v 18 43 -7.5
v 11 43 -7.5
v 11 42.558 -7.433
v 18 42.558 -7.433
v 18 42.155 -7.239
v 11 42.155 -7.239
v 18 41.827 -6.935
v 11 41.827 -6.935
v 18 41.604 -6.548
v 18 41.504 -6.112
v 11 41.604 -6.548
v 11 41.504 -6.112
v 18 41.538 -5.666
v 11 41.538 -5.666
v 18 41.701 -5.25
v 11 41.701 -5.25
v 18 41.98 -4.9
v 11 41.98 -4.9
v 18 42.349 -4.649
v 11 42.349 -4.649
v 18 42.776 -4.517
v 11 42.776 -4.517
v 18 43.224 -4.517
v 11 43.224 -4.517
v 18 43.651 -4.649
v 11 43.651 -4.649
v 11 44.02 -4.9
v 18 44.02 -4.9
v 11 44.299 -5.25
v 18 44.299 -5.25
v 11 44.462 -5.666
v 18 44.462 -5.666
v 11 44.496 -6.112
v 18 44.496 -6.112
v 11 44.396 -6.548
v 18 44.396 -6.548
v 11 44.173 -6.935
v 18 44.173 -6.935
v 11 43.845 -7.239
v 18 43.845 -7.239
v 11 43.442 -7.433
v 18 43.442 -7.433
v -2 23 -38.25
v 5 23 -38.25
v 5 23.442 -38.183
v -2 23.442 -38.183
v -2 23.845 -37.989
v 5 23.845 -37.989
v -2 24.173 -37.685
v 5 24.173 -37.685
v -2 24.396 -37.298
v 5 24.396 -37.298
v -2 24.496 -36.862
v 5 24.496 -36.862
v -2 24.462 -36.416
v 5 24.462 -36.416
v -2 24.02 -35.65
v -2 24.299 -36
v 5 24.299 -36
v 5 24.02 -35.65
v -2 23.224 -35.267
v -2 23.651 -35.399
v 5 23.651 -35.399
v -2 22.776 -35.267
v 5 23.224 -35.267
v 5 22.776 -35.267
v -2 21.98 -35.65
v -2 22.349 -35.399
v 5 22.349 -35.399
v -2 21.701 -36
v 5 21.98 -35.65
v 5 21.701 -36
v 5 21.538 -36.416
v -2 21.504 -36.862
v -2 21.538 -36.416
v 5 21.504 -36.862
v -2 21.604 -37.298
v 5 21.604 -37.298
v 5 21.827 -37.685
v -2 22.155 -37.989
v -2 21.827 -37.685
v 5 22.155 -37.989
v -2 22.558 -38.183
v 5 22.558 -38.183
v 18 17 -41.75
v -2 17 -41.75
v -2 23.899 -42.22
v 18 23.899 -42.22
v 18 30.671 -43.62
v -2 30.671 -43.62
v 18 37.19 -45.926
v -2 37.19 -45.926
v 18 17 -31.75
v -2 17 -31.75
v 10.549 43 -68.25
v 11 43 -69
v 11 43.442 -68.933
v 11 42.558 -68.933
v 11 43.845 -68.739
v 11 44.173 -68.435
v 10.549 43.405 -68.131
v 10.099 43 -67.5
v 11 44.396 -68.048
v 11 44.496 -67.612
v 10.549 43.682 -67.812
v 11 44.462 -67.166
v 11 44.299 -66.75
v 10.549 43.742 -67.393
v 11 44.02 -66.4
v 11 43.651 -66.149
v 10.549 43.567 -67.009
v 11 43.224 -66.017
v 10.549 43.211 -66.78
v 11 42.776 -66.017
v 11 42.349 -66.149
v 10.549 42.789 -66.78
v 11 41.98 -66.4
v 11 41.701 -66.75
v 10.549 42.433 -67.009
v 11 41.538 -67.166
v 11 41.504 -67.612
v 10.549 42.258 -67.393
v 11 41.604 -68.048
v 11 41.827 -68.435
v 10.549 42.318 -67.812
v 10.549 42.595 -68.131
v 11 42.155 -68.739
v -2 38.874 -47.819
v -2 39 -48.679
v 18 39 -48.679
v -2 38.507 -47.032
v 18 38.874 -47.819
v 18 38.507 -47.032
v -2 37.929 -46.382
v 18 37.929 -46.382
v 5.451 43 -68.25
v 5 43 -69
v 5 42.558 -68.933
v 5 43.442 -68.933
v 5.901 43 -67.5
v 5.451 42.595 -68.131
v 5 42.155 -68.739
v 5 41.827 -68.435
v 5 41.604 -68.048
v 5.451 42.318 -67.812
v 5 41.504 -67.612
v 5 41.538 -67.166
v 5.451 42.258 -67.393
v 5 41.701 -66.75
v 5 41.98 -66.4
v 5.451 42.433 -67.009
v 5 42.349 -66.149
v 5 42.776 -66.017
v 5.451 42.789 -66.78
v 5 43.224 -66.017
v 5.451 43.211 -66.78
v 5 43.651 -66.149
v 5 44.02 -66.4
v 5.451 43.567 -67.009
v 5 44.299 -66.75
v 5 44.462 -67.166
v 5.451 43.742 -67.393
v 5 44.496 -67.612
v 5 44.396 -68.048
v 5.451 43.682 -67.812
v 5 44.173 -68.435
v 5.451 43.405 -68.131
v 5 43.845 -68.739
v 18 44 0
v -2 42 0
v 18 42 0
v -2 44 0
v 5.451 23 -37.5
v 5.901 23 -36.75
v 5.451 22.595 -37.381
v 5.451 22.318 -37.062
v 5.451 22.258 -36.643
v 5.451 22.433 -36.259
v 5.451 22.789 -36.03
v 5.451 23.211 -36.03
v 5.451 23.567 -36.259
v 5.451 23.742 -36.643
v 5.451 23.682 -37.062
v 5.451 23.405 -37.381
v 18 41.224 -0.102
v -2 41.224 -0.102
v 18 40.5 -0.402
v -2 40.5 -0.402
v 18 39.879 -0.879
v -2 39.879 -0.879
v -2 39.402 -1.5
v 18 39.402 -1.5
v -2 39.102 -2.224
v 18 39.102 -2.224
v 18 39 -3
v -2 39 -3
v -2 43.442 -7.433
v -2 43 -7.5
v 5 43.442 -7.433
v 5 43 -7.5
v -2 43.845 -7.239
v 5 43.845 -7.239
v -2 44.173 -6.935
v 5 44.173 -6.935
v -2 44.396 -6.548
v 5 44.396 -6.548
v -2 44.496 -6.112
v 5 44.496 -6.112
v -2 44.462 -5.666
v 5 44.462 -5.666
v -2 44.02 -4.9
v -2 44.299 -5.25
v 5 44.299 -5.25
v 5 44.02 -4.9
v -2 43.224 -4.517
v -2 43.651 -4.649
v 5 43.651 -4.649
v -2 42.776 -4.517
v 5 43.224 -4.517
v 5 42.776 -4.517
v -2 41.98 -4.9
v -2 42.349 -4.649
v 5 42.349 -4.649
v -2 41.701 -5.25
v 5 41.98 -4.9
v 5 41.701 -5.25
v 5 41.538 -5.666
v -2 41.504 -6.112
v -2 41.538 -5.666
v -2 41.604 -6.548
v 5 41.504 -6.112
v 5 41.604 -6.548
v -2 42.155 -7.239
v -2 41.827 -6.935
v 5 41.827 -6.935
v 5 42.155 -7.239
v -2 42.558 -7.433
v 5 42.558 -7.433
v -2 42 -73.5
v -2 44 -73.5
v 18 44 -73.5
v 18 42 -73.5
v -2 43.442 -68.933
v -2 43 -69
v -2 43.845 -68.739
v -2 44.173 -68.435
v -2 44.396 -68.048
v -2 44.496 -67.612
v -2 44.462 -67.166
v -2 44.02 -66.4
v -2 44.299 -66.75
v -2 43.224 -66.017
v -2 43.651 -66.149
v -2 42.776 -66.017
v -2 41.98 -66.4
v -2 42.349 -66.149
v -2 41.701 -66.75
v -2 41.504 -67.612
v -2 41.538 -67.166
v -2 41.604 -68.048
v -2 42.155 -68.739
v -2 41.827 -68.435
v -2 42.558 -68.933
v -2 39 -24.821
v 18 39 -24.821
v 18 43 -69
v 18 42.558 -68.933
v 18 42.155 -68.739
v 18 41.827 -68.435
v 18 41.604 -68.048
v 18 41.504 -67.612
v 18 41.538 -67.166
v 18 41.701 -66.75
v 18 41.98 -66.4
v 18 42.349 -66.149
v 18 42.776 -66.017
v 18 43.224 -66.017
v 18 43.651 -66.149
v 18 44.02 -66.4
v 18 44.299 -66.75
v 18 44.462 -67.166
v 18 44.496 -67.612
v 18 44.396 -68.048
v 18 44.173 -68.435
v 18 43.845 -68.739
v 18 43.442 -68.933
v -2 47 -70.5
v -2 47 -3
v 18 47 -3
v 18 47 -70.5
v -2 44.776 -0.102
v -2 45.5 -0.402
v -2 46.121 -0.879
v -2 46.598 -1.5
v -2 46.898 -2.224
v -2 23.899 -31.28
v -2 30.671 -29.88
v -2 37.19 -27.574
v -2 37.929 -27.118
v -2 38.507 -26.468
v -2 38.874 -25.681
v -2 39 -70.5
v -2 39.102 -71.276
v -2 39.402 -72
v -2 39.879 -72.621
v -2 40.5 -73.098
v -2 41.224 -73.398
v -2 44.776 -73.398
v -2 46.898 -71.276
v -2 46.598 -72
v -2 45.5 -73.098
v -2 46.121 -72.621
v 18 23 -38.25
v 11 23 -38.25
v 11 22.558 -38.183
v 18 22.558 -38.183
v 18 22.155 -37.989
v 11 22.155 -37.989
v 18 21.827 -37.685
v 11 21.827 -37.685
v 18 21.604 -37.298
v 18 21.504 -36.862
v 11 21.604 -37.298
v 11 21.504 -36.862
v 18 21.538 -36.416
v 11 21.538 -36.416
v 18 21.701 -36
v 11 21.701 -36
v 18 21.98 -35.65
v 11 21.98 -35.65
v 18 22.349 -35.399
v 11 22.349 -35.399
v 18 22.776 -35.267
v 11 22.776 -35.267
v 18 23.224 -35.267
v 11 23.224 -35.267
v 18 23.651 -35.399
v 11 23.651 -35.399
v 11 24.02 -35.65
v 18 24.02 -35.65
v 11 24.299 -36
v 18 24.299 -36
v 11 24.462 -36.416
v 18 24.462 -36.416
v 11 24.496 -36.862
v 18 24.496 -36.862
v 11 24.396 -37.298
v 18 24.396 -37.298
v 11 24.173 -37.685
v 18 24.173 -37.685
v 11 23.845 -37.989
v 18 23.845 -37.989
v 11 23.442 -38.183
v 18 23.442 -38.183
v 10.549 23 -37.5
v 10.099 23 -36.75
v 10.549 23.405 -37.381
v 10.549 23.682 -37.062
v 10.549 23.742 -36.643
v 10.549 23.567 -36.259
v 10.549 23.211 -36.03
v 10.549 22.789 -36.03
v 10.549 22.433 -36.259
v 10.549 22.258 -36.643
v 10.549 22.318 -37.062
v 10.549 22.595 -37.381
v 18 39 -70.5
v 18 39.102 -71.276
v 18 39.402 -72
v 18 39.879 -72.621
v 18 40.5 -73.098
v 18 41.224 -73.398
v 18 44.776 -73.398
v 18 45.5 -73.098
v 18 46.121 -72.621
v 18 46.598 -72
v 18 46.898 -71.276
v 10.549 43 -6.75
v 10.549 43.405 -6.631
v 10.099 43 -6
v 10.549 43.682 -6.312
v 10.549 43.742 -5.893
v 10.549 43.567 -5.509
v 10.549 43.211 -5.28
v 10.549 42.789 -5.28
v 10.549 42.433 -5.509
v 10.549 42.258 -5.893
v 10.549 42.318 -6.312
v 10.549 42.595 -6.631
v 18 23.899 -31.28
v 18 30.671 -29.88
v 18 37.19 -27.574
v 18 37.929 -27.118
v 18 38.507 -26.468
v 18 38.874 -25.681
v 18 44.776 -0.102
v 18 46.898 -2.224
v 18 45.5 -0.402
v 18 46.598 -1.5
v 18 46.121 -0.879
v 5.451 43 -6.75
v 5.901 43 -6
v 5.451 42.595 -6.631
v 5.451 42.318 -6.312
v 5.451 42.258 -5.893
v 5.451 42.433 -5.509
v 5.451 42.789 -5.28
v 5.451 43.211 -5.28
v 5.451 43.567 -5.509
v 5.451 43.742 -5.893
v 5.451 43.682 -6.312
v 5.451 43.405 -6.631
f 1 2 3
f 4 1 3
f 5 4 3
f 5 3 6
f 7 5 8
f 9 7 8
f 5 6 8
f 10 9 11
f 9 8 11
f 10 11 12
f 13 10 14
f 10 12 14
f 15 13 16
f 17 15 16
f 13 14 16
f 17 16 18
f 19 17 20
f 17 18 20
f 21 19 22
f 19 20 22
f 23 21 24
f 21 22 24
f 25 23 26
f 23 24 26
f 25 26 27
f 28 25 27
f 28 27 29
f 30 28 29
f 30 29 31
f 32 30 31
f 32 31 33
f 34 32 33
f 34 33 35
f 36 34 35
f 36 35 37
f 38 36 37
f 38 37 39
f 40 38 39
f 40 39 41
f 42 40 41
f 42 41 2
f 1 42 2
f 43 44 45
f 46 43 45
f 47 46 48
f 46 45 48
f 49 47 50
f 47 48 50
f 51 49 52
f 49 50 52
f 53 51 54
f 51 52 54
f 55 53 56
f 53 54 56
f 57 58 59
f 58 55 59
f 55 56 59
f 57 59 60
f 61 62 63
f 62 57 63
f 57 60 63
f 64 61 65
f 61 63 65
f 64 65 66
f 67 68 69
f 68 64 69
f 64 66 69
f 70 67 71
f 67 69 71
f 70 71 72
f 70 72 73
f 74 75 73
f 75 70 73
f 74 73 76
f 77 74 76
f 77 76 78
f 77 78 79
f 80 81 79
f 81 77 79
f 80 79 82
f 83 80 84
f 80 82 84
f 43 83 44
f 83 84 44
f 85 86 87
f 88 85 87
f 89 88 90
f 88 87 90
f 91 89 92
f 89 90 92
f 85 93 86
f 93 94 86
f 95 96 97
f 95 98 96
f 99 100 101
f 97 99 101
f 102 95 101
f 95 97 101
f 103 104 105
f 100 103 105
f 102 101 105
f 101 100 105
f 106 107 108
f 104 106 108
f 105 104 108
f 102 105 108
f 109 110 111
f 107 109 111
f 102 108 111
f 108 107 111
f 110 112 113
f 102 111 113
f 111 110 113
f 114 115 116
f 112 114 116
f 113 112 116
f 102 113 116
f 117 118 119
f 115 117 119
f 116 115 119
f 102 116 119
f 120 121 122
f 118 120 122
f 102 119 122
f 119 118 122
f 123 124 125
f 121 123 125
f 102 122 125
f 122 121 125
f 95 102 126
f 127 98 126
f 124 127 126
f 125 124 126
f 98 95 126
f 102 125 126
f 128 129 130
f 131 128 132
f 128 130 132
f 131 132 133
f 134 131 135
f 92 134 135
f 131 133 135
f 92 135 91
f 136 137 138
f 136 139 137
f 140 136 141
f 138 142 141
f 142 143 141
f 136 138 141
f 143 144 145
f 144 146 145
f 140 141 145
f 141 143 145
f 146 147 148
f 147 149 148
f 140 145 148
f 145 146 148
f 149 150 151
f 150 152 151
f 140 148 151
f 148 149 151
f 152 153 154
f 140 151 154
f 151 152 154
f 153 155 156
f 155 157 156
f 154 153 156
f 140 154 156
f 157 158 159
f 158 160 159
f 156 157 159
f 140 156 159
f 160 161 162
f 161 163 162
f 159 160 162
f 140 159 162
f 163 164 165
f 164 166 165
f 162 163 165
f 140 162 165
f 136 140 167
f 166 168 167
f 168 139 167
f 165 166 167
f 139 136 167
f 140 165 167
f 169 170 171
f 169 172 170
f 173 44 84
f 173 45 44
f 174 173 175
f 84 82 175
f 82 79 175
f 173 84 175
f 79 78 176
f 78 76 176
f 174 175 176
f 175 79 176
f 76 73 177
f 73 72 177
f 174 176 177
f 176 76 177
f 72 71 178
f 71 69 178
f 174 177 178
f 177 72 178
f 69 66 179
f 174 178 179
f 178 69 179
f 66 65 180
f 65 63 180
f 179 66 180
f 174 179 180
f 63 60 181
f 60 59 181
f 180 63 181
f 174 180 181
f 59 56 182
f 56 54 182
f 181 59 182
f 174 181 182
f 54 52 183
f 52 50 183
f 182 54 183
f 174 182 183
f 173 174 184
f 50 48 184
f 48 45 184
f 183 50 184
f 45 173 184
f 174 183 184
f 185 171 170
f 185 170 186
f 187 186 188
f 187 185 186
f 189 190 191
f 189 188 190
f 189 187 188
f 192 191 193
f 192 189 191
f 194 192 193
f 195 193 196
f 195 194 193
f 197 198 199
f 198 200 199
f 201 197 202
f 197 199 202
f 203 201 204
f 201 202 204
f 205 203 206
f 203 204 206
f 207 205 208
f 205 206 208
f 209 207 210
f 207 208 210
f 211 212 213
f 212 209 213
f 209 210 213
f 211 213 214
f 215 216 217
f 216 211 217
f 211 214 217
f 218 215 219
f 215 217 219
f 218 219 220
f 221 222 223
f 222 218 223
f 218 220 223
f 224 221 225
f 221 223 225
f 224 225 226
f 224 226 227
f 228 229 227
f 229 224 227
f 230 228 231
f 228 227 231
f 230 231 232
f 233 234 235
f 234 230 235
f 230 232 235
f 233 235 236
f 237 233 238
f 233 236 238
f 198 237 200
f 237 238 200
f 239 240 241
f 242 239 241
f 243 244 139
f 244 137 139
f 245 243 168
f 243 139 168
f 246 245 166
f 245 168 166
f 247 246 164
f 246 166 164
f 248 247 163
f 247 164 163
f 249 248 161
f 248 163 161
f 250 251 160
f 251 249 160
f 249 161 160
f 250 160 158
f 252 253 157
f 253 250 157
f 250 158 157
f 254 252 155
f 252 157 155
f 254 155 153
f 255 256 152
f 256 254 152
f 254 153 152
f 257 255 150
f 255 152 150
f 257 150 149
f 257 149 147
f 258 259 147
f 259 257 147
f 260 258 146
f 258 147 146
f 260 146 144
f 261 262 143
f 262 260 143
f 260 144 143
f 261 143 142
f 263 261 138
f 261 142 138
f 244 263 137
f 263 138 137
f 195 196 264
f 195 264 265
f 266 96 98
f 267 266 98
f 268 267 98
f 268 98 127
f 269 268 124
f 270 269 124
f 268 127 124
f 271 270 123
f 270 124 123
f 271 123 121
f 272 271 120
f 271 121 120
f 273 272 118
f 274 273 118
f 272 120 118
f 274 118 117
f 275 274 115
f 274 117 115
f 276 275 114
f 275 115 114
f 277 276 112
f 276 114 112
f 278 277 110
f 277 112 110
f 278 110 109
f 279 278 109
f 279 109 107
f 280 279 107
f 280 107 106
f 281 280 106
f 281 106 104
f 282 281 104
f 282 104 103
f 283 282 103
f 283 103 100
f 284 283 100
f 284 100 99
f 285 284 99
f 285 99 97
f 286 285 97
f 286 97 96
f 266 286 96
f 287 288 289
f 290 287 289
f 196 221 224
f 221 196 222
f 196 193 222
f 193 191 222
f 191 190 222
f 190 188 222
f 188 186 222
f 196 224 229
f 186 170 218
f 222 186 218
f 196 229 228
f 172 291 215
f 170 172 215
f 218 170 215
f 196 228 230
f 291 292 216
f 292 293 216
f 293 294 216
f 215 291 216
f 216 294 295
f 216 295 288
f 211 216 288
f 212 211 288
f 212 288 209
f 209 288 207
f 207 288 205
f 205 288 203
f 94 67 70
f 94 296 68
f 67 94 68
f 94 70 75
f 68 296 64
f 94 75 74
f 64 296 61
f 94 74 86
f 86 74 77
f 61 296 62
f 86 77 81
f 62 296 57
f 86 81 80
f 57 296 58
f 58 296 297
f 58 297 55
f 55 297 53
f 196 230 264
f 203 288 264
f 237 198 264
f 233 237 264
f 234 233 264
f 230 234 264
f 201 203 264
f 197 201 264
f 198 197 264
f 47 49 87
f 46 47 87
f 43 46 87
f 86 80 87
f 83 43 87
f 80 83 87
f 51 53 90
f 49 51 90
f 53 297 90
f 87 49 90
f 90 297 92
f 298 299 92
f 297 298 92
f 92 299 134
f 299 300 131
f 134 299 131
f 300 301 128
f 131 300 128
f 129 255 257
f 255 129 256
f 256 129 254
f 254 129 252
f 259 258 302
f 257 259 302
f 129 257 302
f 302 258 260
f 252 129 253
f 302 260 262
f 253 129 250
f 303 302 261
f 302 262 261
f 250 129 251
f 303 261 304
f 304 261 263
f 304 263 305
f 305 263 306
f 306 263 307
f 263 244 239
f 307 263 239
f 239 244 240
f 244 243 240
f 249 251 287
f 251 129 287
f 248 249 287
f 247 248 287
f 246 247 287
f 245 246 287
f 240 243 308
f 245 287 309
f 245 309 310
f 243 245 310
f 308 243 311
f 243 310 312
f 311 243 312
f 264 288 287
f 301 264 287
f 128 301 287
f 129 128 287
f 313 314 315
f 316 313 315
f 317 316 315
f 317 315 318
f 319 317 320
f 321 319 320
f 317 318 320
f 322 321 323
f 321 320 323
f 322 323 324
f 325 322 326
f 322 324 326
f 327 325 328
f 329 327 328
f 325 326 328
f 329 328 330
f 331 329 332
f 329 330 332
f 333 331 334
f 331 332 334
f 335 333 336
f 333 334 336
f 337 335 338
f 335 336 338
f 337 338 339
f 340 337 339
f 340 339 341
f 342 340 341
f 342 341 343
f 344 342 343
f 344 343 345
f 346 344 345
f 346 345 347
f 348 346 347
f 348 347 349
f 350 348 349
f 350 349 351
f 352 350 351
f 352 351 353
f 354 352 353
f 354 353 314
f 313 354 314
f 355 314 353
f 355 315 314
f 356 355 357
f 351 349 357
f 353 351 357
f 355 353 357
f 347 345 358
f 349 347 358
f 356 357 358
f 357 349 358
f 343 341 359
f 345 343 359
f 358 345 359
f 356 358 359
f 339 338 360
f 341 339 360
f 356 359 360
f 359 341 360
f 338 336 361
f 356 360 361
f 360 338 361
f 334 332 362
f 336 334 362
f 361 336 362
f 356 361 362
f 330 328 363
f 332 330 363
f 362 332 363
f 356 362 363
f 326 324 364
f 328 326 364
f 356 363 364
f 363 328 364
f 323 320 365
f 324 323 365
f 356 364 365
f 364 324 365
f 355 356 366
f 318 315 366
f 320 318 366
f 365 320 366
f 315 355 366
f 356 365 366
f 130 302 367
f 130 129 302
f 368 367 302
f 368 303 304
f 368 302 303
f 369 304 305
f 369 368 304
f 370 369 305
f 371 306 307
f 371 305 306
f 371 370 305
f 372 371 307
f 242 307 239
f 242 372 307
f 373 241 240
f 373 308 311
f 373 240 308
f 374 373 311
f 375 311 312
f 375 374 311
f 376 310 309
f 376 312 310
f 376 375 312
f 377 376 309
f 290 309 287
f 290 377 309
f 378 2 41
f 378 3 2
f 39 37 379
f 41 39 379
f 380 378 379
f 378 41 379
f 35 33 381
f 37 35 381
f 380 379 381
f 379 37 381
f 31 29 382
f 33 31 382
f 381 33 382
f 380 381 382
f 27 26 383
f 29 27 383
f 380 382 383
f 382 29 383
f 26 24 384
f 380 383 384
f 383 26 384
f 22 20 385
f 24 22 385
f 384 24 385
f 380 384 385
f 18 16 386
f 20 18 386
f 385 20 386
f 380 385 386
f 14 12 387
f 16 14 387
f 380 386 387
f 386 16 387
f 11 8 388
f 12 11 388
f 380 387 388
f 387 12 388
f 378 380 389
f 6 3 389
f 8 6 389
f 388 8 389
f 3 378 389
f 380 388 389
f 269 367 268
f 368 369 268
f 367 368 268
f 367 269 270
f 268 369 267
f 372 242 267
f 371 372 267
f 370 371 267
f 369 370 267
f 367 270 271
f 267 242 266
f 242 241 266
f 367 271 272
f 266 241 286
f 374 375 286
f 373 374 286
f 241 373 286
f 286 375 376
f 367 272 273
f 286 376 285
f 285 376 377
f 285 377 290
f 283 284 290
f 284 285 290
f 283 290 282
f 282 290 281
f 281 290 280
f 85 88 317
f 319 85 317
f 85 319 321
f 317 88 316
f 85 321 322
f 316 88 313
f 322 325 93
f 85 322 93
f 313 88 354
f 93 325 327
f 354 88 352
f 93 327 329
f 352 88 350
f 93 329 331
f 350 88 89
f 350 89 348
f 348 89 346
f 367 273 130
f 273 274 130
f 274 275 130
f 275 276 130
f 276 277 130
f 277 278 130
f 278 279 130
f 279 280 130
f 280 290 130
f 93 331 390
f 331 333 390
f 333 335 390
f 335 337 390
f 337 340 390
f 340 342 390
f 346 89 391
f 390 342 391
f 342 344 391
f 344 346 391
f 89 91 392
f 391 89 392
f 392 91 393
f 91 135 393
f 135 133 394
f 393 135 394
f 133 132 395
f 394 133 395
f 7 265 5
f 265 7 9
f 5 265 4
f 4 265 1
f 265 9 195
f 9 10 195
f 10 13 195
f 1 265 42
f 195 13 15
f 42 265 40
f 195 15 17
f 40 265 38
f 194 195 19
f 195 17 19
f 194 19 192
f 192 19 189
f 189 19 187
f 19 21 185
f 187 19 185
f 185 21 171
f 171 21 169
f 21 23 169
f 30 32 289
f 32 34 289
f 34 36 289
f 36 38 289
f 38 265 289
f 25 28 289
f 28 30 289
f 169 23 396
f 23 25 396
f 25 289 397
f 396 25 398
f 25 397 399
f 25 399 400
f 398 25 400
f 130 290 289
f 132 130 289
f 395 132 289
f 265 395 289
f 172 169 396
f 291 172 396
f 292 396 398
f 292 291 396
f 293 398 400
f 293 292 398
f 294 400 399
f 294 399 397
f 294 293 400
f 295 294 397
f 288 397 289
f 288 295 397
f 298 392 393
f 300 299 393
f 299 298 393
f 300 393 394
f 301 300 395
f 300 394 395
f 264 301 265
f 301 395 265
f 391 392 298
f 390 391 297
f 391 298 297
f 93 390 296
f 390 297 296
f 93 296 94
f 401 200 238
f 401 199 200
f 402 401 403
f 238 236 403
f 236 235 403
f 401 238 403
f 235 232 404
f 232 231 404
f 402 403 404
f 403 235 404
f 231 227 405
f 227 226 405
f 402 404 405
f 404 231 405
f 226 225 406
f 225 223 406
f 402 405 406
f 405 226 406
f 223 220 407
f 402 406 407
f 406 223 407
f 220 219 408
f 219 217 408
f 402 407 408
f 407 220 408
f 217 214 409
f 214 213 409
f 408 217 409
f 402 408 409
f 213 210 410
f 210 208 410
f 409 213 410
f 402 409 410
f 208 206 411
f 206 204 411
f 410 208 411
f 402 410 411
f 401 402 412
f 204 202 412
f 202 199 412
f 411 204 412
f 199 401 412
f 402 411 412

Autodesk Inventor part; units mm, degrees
ref_plane "YZ Plane" through (0, 0, 0) normal (1, 0, 0) x (0, 1, 0)
sketch "Sketch1" plane through (0, 0, 0) normal (0, 0, 1) x (1, 0, 0)
  line L0 (0, 0) -> (16, 0) construction
  line L1 (16, 0) -> (16, 8) construction
  line L2 (0, 8) -> (0, 0) construction
  line L3 (5.5, 10.5) -> (0, 10.5) construction
  line L4 (0, 10.5) -> (0, 8) construction
  line L5 (13.5, 10.5) -> (16, 10.5) construction
  line L6 (16, 10.5) -> (16, 8) construction
  line L7 (6.5, 37) -> (12.5, 37) construction
  line L8 (12.5, 37) -> (12.5, 8) construction
  line L9 (12.5, 8) -> (6.5, 8) construction
  line L10 (6.5, 8) -> (6.5, 37) construction
  line L11 (0.5, 34.5) -> (15.5, 34.5) construction
  line L12 (15.5, 34.5) -> (15.5, 10.5) construction
  line L13 (15.5, 10.5) -> (0.5, 10.5) construction
  line L14 (0.5, 10.5) -> (0.5, 34.5) construction
  line L15 (-2, 0) -> (-2, 39)
  line L16 (-2, 39) -> (18, 39)
  line L17 (8, -29.8106) -> (8, -55.1885) construction
  line L18 (-5, 47) -> (-5, 0)
  line L19 (-2, 0) -> (-5, 0)
  line L20 (-5, 47) -> (10, 47)
  line L21 (21, 47) -> (21, 0)
  line L22 (18, 0) -> (21, 0)
  line L23 (21, 47) -> (10, 47)
  line L24 (18, 0) -> (18, 39)
  line L25 (16.05, 25.6) -> (16.05, 19.4) construction
  line L26 (-0.05, 19.4) -> (-0.05, 25.6) construction
  line L27 (-0.05, 25.6) -> (0.5, 25.6) construction
  line L28 (16.05, 25.6) -> (15.5, 25.6) construction
  line L29 (16.05, 19.4) -> (15.5, 19.4) construction
  line L30 (-0.05, 19.4) -> (0.5, 19.4) construction
  line L31 (16.05, 22.5) -> (-0.05, 22.5) construction
  line L32 (0, 8) -> (16, 8) construction
  line L33 (5.5, 10.5) -> (5.5, 8) construction
  line L34 (13.5, 10.5) -> (13.5, 8) construction
  line L35 (5.5, 8) -> (13.5, 8) construction
  point P0 (6.5, 22.5)
  point P1 (0.5, 22.5)
  point P2 (9.5, 8)
  point P3 (8, 0)
  point P4 (8, 39)
  point P5 (8, -42.4996)
  point P6 (9.5, 8)
  point P7 (8, 22.5)
  dimension "d1" = 16
  dimension "d7" = 6
  dimension "d9" = 6
  dimension "d10" = 3
  dimension "d11" = 29
  dimension "d12" = 24
  dimension "d20" = 2
  dimension "thickness" = 3
  dimension "d23" = 8
  dimension "d31" = 22.5
  dimension "d40" = 24.5
  dimension "d41" = 39
  dimension "d60" = 6.2
  dimension "d62" = 16.1
  dimension "d63" = 8
  dimension "d64" = 8
  dimension "d65" = 1
  dimension "d66" = 2.5
  dimension "d97" = 2
extrude "LENGTH" add sketch "Sketch1" against normal blind 73.5
sketch "Sketch2" plane through (-5, 0, 0) normal (-1, 0, 0) x (0, 0, 1)
  circle A0 centre (-12, 22.5) radius 3
  circle A1 centre (-61.5, 22.5) radius 3
  line L0 (-73.5, 0) -> (-73.5, 47) construction
  line L1 (0, 47) -> (0, 0) construction
  dimension "d26" = 6
  dimension "d28" = 6
  dimension "d29" = 12
  dimension "d30" = 12
  dimension "d32" = 22.5
extrude "Extrusion2" cut sketch "Sketch2" against normal through all
ref_plane "Work Plane1" through (-5, 47, 0) normal (0.7071, 0.7071, 0) x (0, 0, -1)
ref_plane "CentrePlane" through (8, 0, 0) normal (1, 0, 0) x (0, 0, -1)
sketch "Measurements" plane through (-5, 0, 0) normal (-1, 0, 0) x (0, 0, 1)
  line L0 (-18.9044, 8) -> (-18.9044, 0) construction
  line L1 (0, 0) -> (0, 8) construction
  spline S0 degree 3 poles (-18.9044, 0) (-18.8729, 0.004) (-18.7747, 0.0145) (-18.6089, 0.0198) (-18.4076, 0.0173) (-18.2077, -0.0064) (-18.0095, -0.0413) (-17.7511, -0.1137) (-17.4304, -0.2111) (-17.1073, -0.2999) (-16.8501, -0.3765) (-16.6638, -0.4528) (-16.4821, -0.5394) (-16.3106, -0.6447) (-16.1439, -0.7575) (-15.9893, -0.8866) (-15.8435, -1.0251) (-15.7068, -1.1728) (-15.5834, -1.3319) (-15.4695, -1.4977) (-15.3662, -1.6705) (-15.2464, -1.9105) (-15.1208, -2.2219) (-15.0142, -2.6104) (-14.9462, -3.0072) (-14.9104, -3.408) (-14.9034, -3.8104) (-14.9258, -4.2123) (-14.9692, -4.6123) (-15.0344, -5.0094) (-15.0913, -5.2714) (-15.1198, -5.4024) knots -0.847201 -0.847201 -0.847201 -0.847201 -0.83705 -0.815587 -0.794126 -0.772659 -0.751201 -0.729734 -0.686802 -0.64387 -0.622403 -0.600945 -0.579478 -0.558017 -0.536554 -0.515088 -0.49363 -0.472163 -0.450698 -0.429238 -0.407769 -0.386302 -0.343394 -0.300476 -0.257562 -0.214646 -0.17172 -0.12879 -0.085861 -0.04293 0 0 0 0 construction
  spline S1 degree 3 poles (-4.5152, -5.4024) (-4.5336, -5.2605) (-4.5704, -4.9766) (-4.6037, -4.5484) (-4.6135, -4.119) (-4.6009, -3.6896) (-4.557, -3.2623) (-4.4825, -2.8392) (-4.3742, -2.4233) (-4.2256, -2.0199) (-4.0637, -1.7) (-3.9145, -1.4557) (-3.7891, -1.2813) (-3.6528, -1.1153) (-3.5072, -0.9573) (-3.3484, -0.8126) (-3.1807, -0.6785) (-3.0046, -0.5552) (-2.8172, -0.4504) (-2.6251, -0.3539) (-2.424, -0.2783) (-2.219, -0.214) (-1.9385, -0.1559) (-1.5868, -0.0908) (-1.2369, -0.0163) (-0.9555, 0.0373) (-0.7415, 0.0564) (-0.5268, 0.0635) (-0.3125, 0.0479) (-0.1366, 0.0272) (-0.0331, 0.0071) (0, 0) knots -1.373604 -1.373604 -1.373604 -1.373604 -1.330674 -1.287743 -1.244814 -1.201884 -1.158958 -1.116042 -1.073128 -1.03021 -0.987302 -0.965835 -0.944366 -0.922906 -0.901441 -0.879974 -0.858516 -0.83705 -0.815587 -0.794126 -0.772659 -0.751201 -0.729734 -0.686802 -0.64387 -0.622403 -0.600945 -0.579478 -0.558017 -0.536554 -0.526403 -0.526403 -0.526403 -0.526403 construction
  spline S2 degree 3 poles (-7.7374, -14.9236) (-7.6284, -14.7418) (-7.4104, -14.3783) (-7.0987, -13.824) (-6.7983, -13.2636) (-6.5111, -12.6963) (-6.2373, -12.1224) (-5.9778, -11.5419) (-5.7335, -10.9548) (-5.5053, -10.3613) (-5.2945, -9.7613) (-5.1024, -9.1551) (-4.9307, -8.5428) (-4.7815, -7.9246) (-4.6579, -7.3008) (-4.5633, -6.6718) (-4.516, -6.1439) (-4.4999, -5.72) (-4.5101, -5.5083) (-4.5152, -5.4024) knots -1.017256 -1.017256 -1.017256 -1.017256 -0.953675 -0.890094 -0.826513 -0.762932 -0.699351 -0.63577 -0.572189 -0.508609 -0.445029 -0.381449 -0.31787 -0.254291 -0.190714 -0.127139 -0.063568 -0.03178 0 0 0 0 construction
  arc A0 (-11.8976, -14.9236) -> (-7.7374, -14.9236) centre (-9.8175, 41.288) ccw construction
  spline S3 degree 3 poles (-15.1198, -5.4024) (-15.1249, -5.5083) (-15.1352, -5.72) (-15.119, -6.1439) (-15.0717, -6.6718) (-14.9771, -7.3008) (-14.8535, -7.9246) (-14.7043, -8.5428) (-14.5326, -9.1551) (-14.3405, -9.7613) (-14.1297, -10.3613) (-13.9015, -10.9548) (-13.6572, -11.5419) (-13.3977, -12.1224) (-13.1239, -12.6963) (-12.8366, -13.2636) (-12.5363, -13.824) (-12.2245, -14.3782) (-12.0065, -14.7418) (-11.8976, -14.9236) knots -1.017256 -1.017256 -1.017256 -1.017256 -0.985476 -0.953687 -0.890117 -0.826542 -0.762964 -0.699386 -0.635807 -0.572227 -0.508647 -0.445066 -0.381486 -0.317905 -0.254324 -0.190743 -0.127162 -0.063581 0 0 0 0 construction
  line L2 (-18.9044, 8) -> (0, 8) construction
  line L3 (0, 43) -> (0, 0) construction
  circle A1 centre (-9.8175, -59.712) radius 50 construction
  line L4 (0, 0) -> (-73.5, 0) projected
  circle A2 centre (-12, 22.5) radius 3 projected
  circle A3 centre (-61.5, 22.5) radius 3 projected
  circle A4 centre (-12, 22.5) radius 14.5
  circle A5 centre (-61.5, 22.5) radius 14.5
  point P0 (-9.8175, -14.962)
  dimension "d42" = 8
  dimension "d43" = 100
  dimension "d44" = 44.75
  dimension "d46" = 9.8175
  dimension "d47" = 14.962
  dimension "d49" = 59.712
  dimension "d67" = 29
  dimension "d68" = 29
sketch "Sketch5" plane through (-5, 0, 0) normal (-1, 0, 0) x (0, 0, 1)
  circle A0 centre (-36.75, -59.712) radius 50 construction
  line L0 (0, 0) -> (-73.5, 0) projected
  circle A1 centre (-36.75, -59.712) radius 5
  line L1 (-73.5, 0) -> (-48.8926, -64.355)
  arc A2 (-48.8926, -64.355) -> (-24.6074, -64.355) centre (-36.75, -59.712) ccw
  line L2 (-24.6074, -64.355) -> (0, 0)
  point P0 (-36.75, 0)
  dimension "d50" = 59.712
  dimension "d51" = 100
  dimension "bearingOD" = 10
  dimension "d53" = 8
extrude "Extrusion4" add sketch "Sketch5" against normal up to surface (3 mm away)
mirror "Mirror2" about plane through (8, 0, 0) normal (1, 0, 0) of "Extrusion4"
sketch "Sketch6" plane through (-2, 39, 0) normal (1, 0, 0) x (0, 0, -1)
  line L0 (0, 0) -> (73.5, 0) projected
  circle A0 centre (12, -16.5) radius 3 projected
  circle A1 centre (12, -16.5) radius 3 projected
  circle A2 centre (12, -16.5) radius 14.5 projected
  circle A3 centre (61.5, -16.5) radius 14.5 projected
  circle A4 centre (36.75, -98.712) radius 5 projected
  circle A5 centre (12, -16.5) radius 3 projected
  circle A6 centre (61.5, -16.5) radius 3 projected
  line L1 (0, 8) -> (0, -39) projected
  line L2 (0, 8) -> (73.5, 8) projected
  line L3 (73.5, -39) -> (73.5, 8) projected
  line L4 (73.5, -39) -> (48.8926, -103.355) projected
  arc A7 (24.6074, -103.355) -> (48.8926, -103.355) centre (36.75, -98.712) ccw projected
  line L5 (24.6074, -103.355) -> (0, -39) projected
  line L6 (31.75, -22) -> (41.75, -22)
  arc A8 (46.75, 0) -> (41.75, -22) centre (92.65, -22) ccw
  line L7 (36.75, -22) -> (36.75, 0)
  arc A9 (31.75, -22) -> (26.75, 0) centre (-19.15, -22) ccw
  line L8 (41.75, -22) -> (41.75, -11.9859) construction
  line L9 (36.75, 0) -> (46.75, 0) construction
  line L10 (-19.15, 23.5572) -> (92.65, 23.5572)
  line L11 (92.65, 23.5572) -> (92.65, -126.6469)
  line L12 (92.65, -126.6469) -> (-19.15, -126.6469)
  line L13 (-19.15, -126.6469) -> (-19.15, 23.5572)
  point P0 (26.75, 0)
  dimension "d70" = 30
  dimension "d72" = 10
  dimension "d74" = 10
extrude "Extrusion5" add sketch "Sketch6" along normal up to surface (20 mm away) contours L0 L7 L6 A9 | L0 A8 L6 L7
extrude "Extrusion6" cut sketch "Sketch6" against normal blind 10 contours L1 L2 L3 L0 | L0 A9 L6 A8 L3 A3 L4 A7 L5 L1 A2 | L0 L7 L6 A9 | L1 A2 | A2 L1 | L0 A8 L6 L7 | L3 A3 | A3 L3 | A0 | A4 | A6 | L10 L11 L12 L13
mirror "Mirror3" about plane through (8, 0, 0) normal (1, 0, 0) of "Extrusion6"
sketch "Sketch8" plane through (18, 39, -73.5) normal (1, 0, 0) x (0, 0, -1)
  circle A0 centre (-67.5, 4) radius 3.36
  circle A1 centre (-36.75, -16) radius 3.36
  line L0 (-73.5, 8) -> (0, 8) projected
  line L1 (-73.5, 0) -> (-73.5, 8) projected
  line L2 (-41.75, -22) -> (-31.75, -22) projected
  line L3 (-36.75, 21.8835) -> (-36.75, 39.4907)
  circle A2 centre (-6, 4) radius 3.36
  point P0 (-73.5, -39)
  point P1 (-36.75, 8)
  point P2 (-73.5, 4)
  point P3 (-36.75, 8)
  dimension "d79" = 6.72
  dimension "d80" = 6
  dimension "d81" = 6
hole "Hole1" at (18, 43, -6) at (18, 43, -67.5) at (18, 23, -36.75) direction (-1, 0, 0) diameter 3 depth 7 tip angle 118
thread "Thread1" size "M3x0.5" class "6H" standard "ANSI Metric M Profile" full length
thread "Thread2" size "M3x0.5" class "6H" standard "ANSI Metric M Profile" full length
thread "Thread3" size "M3x0.5" class "6H" standard "ANSI Metric M Profile" full length
mirror "Mirror4" about plane through (8, 0, 0) normal (1, 0, 0) of "Hole1"
fillet "Fillet3" radius 3 2 edges at (8, 39, -46.75) (8, 39, -26.75)
fillet "Fillet4" radius 3 4 edges at (8, 47, 0) (8, 47, -73.5) (8, 39, 0) (8, 39, -73.5)
equation "\"d23\" = d0"
equation "\"tol\" = 1"
equation "\"d0\" = 8"
properties part number "trolley6mm-centre"
